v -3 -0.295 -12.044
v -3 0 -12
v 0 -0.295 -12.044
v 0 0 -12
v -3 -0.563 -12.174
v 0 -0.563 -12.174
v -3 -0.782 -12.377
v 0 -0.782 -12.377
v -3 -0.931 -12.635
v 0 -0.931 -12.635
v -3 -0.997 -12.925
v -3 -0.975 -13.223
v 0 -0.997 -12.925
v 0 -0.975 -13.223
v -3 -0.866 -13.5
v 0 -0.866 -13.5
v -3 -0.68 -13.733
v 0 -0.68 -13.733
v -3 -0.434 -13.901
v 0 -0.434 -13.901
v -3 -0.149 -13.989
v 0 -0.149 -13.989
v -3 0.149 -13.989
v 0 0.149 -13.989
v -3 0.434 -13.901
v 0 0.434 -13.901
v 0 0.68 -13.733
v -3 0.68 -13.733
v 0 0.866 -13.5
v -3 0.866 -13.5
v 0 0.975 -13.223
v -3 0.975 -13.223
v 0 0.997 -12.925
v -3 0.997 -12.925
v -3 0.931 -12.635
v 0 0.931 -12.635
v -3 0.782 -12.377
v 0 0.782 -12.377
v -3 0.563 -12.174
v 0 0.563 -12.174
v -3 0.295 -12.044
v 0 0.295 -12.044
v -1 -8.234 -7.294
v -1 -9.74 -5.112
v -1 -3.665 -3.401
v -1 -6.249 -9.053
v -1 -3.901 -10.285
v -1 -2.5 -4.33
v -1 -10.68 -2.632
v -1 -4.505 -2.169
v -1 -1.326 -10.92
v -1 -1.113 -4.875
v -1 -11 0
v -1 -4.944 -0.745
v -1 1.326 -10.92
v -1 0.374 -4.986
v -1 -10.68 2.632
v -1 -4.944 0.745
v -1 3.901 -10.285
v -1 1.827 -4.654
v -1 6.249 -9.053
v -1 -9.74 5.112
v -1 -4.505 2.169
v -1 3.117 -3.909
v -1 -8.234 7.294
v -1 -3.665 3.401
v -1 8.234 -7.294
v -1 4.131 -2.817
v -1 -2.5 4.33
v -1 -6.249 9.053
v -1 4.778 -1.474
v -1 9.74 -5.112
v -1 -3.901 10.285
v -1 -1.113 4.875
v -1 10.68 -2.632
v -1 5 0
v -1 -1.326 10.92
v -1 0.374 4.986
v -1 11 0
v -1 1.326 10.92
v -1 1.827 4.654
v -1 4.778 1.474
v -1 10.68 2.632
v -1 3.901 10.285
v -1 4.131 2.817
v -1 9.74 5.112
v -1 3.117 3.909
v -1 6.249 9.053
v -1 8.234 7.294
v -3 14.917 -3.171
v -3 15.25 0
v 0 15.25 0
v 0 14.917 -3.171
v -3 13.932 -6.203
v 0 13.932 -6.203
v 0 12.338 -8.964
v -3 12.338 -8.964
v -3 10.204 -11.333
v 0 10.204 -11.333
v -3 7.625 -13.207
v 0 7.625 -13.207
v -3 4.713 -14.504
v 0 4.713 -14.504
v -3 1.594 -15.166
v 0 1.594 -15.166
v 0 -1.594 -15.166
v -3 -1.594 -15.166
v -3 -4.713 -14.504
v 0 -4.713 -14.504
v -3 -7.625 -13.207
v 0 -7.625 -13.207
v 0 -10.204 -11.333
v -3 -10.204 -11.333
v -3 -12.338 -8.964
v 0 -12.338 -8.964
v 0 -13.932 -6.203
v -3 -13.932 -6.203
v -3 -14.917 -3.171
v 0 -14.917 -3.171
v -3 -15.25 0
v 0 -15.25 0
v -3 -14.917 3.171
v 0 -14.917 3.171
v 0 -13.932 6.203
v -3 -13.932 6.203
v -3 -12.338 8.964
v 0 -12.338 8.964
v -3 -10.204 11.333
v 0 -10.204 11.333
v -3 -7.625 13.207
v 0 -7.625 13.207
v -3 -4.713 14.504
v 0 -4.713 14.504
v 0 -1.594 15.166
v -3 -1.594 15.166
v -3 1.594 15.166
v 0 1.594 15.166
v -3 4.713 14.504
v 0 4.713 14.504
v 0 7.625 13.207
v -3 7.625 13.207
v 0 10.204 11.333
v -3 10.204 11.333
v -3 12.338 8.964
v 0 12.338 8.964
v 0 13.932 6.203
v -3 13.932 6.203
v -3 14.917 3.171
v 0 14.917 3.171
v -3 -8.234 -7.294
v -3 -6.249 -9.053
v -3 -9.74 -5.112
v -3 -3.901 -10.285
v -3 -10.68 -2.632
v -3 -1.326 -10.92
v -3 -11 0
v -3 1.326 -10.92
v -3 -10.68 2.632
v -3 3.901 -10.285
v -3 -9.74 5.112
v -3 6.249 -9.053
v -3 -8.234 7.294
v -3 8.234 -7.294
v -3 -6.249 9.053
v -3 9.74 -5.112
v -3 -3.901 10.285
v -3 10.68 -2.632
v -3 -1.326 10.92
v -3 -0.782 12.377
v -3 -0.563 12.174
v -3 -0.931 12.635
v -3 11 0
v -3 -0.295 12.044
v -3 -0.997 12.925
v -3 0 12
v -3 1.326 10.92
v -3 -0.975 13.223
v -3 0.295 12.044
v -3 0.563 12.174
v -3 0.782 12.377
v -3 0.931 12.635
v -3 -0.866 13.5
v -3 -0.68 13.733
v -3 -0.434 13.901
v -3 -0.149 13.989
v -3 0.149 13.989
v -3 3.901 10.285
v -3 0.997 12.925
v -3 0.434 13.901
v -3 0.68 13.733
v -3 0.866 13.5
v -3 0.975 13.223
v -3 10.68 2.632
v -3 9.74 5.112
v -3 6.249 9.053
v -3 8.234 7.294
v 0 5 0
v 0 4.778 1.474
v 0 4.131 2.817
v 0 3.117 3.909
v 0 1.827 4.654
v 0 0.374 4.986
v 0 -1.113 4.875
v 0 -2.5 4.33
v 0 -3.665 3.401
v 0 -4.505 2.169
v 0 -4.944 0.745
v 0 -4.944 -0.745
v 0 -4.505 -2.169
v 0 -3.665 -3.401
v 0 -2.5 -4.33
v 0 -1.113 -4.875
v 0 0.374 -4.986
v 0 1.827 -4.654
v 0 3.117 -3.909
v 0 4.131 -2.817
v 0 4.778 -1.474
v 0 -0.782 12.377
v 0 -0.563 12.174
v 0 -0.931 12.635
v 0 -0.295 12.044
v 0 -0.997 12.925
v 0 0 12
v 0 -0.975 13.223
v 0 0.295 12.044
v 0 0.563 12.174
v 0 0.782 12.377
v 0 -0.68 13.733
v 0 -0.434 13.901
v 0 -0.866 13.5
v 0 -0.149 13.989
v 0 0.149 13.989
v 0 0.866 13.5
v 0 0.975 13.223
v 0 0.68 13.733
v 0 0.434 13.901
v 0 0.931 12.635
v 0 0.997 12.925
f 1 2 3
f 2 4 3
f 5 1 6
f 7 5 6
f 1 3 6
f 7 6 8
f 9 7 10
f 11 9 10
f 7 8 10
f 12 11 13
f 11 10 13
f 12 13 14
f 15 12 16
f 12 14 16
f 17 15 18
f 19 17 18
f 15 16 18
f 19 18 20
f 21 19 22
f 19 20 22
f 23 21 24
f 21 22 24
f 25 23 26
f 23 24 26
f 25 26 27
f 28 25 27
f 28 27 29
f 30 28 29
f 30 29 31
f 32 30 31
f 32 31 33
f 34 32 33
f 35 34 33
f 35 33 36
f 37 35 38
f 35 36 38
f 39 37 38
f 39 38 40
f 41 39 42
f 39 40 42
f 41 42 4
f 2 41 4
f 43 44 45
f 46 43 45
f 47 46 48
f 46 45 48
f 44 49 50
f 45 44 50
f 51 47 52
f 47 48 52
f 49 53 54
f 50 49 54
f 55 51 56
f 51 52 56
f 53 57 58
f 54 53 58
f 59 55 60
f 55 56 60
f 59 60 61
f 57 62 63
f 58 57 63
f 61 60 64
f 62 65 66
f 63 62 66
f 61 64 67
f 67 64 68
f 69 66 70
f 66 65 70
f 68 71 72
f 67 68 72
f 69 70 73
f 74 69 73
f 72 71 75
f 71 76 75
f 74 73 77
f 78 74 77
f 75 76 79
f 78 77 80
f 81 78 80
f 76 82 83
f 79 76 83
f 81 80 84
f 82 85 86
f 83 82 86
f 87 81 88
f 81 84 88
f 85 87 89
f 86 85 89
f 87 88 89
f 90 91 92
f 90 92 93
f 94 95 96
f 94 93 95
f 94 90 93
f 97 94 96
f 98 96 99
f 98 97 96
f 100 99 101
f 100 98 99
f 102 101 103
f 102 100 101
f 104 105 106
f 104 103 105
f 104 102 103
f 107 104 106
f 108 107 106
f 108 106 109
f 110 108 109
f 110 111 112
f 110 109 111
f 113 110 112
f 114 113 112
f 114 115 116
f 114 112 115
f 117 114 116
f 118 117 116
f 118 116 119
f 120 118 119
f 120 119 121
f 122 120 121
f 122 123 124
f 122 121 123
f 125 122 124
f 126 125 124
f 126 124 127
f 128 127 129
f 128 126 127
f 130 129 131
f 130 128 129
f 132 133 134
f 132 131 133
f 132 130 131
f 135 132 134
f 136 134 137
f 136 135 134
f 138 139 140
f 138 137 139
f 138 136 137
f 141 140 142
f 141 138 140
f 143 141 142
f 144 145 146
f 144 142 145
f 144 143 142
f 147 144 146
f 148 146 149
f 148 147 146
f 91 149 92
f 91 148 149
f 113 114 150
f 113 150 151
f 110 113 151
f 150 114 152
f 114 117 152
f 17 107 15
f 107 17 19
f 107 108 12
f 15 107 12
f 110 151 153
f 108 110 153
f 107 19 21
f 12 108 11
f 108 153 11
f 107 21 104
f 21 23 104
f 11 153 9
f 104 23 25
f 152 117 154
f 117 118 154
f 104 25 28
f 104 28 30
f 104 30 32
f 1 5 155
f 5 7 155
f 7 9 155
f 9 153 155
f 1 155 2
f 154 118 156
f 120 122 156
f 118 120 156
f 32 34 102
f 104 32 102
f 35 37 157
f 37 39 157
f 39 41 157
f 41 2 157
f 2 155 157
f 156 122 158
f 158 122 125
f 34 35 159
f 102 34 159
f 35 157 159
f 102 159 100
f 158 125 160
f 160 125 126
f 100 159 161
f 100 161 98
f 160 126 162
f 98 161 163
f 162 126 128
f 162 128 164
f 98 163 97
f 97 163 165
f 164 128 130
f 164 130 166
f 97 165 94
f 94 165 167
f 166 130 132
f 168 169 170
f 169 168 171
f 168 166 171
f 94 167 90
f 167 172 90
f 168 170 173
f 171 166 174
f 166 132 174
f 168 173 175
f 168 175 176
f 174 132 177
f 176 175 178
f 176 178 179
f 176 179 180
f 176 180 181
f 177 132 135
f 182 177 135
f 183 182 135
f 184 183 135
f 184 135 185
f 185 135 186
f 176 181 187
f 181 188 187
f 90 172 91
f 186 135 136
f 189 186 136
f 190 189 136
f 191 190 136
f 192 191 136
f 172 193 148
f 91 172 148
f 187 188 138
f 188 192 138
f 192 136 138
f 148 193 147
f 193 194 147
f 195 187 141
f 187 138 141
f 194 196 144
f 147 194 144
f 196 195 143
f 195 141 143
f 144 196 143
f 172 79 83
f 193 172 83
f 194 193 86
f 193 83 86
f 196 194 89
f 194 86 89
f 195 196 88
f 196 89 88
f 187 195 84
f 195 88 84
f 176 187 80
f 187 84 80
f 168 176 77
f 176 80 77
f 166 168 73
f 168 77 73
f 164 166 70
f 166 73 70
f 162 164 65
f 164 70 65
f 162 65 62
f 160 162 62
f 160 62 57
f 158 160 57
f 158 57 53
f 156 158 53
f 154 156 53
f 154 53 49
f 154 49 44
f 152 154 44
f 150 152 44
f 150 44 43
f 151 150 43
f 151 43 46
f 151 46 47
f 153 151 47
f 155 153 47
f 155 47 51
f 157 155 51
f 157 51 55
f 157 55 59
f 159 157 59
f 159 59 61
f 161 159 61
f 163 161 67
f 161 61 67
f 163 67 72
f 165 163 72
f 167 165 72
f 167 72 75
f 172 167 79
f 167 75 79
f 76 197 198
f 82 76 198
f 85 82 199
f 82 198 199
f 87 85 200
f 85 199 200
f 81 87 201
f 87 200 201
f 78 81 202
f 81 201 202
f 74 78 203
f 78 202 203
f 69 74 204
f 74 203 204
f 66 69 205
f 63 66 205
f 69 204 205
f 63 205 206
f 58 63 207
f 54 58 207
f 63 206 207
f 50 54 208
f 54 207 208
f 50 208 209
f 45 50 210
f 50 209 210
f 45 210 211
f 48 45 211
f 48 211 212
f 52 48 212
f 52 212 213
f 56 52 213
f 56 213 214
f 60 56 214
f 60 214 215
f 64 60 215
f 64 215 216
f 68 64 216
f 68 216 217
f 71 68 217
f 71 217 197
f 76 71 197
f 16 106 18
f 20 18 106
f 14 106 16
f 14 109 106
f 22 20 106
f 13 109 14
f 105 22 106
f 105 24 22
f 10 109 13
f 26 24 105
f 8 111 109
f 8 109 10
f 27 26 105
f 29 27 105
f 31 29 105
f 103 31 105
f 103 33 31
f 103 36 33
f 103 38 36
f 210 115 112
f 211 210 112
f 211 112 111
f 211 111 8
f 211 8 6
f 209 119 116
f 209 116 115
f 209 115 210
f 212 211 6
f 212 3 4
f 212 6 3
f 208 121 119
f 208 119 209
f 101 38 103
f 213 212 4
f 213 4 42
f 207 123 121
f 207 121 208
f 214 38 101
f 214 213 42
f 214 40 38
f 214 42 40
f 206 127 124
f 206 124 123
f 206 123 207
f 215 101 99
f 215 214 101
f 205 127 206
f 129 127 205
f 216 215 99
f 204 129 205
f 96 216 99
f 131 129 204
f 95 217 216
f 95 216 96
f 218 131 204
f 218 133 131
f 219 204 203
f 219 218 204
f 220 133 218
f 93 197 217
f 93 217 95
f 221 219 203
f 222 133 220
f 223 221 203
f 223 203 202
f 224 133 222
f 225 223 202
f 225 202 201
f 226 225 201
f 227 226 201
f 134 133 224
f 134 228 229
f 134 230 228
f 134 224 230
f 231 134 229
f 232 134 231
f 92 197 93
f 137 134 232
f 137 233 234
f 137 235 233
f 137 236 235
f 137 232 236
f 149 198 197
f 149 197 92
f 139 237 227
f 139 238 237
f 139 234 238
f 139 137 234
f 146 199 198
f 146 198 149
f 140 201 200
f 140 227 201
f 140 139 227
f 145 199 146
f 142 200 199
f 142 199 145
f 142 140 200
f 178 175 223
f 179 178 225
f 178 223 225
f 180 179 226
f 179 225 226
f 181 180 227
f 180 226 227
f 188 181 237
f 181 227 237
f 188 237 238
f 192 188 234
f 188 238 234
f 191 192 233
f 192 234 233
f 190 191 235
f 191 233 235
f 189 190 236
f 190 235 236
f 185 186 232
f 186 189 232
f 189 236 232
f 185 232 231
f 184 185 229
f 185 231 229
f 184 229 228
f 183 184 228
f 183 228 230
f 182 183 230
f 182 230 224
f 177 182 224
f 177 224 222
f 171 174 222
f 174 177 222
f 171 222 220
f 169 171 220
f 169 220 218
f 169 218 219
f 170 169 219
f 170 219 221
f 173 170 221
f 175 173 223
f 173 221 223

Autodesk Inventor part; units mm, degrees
ref_plane "YZ Plane" through (0, 0, 0) normal (1, 0, 0) x (0, 1, 0)
ref_plane "XZ Plane" through (0, 0, 0) normal (0, 1, 0) x (-1, 0, 0)
ref_plane "XY Plane" through (0, 0, 0) normal (0, 0, 1) x (1, 0, 0)
sketch "Sketch1" plane through (0, 0, 0) normal (0, 0, 1) x (1, 0, 0)
  line L0 (0, -3.05) -> (0, 18.3) construction
  line L1 (-3.6, 0) -> (0.6, 0) construction
  line L2 (0, 5) -> (0, 15.25)
  line L3 (0, 15.25) -> (-3, 15.25)
  line L4 (-3, 15.25) -> (-3, 11)
  line L5 (-3, 11) -> (-1, 11)
  line L6 (-1, 11) -> (-1, 5)
  line L7 (-1, 5) -> (0, 5)
  point P0 (0, 0)
  dimension "d0" = 30.5
  dimension "d1" = 10
  dimension "d2" = 22
  dimension "d3" = 1
  dimension "d4" = 3
revolve "Revolution1" add sketch "Sketch1" angle 360 about axis through (-10, 0, 0) along (1, 0, 0)
sketch "Sketch2" plane through (-3, 0, 0) normal (-1, 0, 0) x (0, 0, 1)
  line L0 (0, -21.35) -> (0, 21.35) projected
  line L1 (-21.35, 0) -> (21.35, 0) projected
  point P0 (0, 0)
  point P1 (-13, 0)
  dimension "d6" = 13
hole "Hole1" at (-3, 0, -13) direction (1, 0, 0) diameter 2 end through all
mirror "Mirror1" about plane through (0, 0, 0) normal (0, 0, 1) of "Hole1"
properties part number "P119PorteLentilleSouple" material "ABS Plastic"
